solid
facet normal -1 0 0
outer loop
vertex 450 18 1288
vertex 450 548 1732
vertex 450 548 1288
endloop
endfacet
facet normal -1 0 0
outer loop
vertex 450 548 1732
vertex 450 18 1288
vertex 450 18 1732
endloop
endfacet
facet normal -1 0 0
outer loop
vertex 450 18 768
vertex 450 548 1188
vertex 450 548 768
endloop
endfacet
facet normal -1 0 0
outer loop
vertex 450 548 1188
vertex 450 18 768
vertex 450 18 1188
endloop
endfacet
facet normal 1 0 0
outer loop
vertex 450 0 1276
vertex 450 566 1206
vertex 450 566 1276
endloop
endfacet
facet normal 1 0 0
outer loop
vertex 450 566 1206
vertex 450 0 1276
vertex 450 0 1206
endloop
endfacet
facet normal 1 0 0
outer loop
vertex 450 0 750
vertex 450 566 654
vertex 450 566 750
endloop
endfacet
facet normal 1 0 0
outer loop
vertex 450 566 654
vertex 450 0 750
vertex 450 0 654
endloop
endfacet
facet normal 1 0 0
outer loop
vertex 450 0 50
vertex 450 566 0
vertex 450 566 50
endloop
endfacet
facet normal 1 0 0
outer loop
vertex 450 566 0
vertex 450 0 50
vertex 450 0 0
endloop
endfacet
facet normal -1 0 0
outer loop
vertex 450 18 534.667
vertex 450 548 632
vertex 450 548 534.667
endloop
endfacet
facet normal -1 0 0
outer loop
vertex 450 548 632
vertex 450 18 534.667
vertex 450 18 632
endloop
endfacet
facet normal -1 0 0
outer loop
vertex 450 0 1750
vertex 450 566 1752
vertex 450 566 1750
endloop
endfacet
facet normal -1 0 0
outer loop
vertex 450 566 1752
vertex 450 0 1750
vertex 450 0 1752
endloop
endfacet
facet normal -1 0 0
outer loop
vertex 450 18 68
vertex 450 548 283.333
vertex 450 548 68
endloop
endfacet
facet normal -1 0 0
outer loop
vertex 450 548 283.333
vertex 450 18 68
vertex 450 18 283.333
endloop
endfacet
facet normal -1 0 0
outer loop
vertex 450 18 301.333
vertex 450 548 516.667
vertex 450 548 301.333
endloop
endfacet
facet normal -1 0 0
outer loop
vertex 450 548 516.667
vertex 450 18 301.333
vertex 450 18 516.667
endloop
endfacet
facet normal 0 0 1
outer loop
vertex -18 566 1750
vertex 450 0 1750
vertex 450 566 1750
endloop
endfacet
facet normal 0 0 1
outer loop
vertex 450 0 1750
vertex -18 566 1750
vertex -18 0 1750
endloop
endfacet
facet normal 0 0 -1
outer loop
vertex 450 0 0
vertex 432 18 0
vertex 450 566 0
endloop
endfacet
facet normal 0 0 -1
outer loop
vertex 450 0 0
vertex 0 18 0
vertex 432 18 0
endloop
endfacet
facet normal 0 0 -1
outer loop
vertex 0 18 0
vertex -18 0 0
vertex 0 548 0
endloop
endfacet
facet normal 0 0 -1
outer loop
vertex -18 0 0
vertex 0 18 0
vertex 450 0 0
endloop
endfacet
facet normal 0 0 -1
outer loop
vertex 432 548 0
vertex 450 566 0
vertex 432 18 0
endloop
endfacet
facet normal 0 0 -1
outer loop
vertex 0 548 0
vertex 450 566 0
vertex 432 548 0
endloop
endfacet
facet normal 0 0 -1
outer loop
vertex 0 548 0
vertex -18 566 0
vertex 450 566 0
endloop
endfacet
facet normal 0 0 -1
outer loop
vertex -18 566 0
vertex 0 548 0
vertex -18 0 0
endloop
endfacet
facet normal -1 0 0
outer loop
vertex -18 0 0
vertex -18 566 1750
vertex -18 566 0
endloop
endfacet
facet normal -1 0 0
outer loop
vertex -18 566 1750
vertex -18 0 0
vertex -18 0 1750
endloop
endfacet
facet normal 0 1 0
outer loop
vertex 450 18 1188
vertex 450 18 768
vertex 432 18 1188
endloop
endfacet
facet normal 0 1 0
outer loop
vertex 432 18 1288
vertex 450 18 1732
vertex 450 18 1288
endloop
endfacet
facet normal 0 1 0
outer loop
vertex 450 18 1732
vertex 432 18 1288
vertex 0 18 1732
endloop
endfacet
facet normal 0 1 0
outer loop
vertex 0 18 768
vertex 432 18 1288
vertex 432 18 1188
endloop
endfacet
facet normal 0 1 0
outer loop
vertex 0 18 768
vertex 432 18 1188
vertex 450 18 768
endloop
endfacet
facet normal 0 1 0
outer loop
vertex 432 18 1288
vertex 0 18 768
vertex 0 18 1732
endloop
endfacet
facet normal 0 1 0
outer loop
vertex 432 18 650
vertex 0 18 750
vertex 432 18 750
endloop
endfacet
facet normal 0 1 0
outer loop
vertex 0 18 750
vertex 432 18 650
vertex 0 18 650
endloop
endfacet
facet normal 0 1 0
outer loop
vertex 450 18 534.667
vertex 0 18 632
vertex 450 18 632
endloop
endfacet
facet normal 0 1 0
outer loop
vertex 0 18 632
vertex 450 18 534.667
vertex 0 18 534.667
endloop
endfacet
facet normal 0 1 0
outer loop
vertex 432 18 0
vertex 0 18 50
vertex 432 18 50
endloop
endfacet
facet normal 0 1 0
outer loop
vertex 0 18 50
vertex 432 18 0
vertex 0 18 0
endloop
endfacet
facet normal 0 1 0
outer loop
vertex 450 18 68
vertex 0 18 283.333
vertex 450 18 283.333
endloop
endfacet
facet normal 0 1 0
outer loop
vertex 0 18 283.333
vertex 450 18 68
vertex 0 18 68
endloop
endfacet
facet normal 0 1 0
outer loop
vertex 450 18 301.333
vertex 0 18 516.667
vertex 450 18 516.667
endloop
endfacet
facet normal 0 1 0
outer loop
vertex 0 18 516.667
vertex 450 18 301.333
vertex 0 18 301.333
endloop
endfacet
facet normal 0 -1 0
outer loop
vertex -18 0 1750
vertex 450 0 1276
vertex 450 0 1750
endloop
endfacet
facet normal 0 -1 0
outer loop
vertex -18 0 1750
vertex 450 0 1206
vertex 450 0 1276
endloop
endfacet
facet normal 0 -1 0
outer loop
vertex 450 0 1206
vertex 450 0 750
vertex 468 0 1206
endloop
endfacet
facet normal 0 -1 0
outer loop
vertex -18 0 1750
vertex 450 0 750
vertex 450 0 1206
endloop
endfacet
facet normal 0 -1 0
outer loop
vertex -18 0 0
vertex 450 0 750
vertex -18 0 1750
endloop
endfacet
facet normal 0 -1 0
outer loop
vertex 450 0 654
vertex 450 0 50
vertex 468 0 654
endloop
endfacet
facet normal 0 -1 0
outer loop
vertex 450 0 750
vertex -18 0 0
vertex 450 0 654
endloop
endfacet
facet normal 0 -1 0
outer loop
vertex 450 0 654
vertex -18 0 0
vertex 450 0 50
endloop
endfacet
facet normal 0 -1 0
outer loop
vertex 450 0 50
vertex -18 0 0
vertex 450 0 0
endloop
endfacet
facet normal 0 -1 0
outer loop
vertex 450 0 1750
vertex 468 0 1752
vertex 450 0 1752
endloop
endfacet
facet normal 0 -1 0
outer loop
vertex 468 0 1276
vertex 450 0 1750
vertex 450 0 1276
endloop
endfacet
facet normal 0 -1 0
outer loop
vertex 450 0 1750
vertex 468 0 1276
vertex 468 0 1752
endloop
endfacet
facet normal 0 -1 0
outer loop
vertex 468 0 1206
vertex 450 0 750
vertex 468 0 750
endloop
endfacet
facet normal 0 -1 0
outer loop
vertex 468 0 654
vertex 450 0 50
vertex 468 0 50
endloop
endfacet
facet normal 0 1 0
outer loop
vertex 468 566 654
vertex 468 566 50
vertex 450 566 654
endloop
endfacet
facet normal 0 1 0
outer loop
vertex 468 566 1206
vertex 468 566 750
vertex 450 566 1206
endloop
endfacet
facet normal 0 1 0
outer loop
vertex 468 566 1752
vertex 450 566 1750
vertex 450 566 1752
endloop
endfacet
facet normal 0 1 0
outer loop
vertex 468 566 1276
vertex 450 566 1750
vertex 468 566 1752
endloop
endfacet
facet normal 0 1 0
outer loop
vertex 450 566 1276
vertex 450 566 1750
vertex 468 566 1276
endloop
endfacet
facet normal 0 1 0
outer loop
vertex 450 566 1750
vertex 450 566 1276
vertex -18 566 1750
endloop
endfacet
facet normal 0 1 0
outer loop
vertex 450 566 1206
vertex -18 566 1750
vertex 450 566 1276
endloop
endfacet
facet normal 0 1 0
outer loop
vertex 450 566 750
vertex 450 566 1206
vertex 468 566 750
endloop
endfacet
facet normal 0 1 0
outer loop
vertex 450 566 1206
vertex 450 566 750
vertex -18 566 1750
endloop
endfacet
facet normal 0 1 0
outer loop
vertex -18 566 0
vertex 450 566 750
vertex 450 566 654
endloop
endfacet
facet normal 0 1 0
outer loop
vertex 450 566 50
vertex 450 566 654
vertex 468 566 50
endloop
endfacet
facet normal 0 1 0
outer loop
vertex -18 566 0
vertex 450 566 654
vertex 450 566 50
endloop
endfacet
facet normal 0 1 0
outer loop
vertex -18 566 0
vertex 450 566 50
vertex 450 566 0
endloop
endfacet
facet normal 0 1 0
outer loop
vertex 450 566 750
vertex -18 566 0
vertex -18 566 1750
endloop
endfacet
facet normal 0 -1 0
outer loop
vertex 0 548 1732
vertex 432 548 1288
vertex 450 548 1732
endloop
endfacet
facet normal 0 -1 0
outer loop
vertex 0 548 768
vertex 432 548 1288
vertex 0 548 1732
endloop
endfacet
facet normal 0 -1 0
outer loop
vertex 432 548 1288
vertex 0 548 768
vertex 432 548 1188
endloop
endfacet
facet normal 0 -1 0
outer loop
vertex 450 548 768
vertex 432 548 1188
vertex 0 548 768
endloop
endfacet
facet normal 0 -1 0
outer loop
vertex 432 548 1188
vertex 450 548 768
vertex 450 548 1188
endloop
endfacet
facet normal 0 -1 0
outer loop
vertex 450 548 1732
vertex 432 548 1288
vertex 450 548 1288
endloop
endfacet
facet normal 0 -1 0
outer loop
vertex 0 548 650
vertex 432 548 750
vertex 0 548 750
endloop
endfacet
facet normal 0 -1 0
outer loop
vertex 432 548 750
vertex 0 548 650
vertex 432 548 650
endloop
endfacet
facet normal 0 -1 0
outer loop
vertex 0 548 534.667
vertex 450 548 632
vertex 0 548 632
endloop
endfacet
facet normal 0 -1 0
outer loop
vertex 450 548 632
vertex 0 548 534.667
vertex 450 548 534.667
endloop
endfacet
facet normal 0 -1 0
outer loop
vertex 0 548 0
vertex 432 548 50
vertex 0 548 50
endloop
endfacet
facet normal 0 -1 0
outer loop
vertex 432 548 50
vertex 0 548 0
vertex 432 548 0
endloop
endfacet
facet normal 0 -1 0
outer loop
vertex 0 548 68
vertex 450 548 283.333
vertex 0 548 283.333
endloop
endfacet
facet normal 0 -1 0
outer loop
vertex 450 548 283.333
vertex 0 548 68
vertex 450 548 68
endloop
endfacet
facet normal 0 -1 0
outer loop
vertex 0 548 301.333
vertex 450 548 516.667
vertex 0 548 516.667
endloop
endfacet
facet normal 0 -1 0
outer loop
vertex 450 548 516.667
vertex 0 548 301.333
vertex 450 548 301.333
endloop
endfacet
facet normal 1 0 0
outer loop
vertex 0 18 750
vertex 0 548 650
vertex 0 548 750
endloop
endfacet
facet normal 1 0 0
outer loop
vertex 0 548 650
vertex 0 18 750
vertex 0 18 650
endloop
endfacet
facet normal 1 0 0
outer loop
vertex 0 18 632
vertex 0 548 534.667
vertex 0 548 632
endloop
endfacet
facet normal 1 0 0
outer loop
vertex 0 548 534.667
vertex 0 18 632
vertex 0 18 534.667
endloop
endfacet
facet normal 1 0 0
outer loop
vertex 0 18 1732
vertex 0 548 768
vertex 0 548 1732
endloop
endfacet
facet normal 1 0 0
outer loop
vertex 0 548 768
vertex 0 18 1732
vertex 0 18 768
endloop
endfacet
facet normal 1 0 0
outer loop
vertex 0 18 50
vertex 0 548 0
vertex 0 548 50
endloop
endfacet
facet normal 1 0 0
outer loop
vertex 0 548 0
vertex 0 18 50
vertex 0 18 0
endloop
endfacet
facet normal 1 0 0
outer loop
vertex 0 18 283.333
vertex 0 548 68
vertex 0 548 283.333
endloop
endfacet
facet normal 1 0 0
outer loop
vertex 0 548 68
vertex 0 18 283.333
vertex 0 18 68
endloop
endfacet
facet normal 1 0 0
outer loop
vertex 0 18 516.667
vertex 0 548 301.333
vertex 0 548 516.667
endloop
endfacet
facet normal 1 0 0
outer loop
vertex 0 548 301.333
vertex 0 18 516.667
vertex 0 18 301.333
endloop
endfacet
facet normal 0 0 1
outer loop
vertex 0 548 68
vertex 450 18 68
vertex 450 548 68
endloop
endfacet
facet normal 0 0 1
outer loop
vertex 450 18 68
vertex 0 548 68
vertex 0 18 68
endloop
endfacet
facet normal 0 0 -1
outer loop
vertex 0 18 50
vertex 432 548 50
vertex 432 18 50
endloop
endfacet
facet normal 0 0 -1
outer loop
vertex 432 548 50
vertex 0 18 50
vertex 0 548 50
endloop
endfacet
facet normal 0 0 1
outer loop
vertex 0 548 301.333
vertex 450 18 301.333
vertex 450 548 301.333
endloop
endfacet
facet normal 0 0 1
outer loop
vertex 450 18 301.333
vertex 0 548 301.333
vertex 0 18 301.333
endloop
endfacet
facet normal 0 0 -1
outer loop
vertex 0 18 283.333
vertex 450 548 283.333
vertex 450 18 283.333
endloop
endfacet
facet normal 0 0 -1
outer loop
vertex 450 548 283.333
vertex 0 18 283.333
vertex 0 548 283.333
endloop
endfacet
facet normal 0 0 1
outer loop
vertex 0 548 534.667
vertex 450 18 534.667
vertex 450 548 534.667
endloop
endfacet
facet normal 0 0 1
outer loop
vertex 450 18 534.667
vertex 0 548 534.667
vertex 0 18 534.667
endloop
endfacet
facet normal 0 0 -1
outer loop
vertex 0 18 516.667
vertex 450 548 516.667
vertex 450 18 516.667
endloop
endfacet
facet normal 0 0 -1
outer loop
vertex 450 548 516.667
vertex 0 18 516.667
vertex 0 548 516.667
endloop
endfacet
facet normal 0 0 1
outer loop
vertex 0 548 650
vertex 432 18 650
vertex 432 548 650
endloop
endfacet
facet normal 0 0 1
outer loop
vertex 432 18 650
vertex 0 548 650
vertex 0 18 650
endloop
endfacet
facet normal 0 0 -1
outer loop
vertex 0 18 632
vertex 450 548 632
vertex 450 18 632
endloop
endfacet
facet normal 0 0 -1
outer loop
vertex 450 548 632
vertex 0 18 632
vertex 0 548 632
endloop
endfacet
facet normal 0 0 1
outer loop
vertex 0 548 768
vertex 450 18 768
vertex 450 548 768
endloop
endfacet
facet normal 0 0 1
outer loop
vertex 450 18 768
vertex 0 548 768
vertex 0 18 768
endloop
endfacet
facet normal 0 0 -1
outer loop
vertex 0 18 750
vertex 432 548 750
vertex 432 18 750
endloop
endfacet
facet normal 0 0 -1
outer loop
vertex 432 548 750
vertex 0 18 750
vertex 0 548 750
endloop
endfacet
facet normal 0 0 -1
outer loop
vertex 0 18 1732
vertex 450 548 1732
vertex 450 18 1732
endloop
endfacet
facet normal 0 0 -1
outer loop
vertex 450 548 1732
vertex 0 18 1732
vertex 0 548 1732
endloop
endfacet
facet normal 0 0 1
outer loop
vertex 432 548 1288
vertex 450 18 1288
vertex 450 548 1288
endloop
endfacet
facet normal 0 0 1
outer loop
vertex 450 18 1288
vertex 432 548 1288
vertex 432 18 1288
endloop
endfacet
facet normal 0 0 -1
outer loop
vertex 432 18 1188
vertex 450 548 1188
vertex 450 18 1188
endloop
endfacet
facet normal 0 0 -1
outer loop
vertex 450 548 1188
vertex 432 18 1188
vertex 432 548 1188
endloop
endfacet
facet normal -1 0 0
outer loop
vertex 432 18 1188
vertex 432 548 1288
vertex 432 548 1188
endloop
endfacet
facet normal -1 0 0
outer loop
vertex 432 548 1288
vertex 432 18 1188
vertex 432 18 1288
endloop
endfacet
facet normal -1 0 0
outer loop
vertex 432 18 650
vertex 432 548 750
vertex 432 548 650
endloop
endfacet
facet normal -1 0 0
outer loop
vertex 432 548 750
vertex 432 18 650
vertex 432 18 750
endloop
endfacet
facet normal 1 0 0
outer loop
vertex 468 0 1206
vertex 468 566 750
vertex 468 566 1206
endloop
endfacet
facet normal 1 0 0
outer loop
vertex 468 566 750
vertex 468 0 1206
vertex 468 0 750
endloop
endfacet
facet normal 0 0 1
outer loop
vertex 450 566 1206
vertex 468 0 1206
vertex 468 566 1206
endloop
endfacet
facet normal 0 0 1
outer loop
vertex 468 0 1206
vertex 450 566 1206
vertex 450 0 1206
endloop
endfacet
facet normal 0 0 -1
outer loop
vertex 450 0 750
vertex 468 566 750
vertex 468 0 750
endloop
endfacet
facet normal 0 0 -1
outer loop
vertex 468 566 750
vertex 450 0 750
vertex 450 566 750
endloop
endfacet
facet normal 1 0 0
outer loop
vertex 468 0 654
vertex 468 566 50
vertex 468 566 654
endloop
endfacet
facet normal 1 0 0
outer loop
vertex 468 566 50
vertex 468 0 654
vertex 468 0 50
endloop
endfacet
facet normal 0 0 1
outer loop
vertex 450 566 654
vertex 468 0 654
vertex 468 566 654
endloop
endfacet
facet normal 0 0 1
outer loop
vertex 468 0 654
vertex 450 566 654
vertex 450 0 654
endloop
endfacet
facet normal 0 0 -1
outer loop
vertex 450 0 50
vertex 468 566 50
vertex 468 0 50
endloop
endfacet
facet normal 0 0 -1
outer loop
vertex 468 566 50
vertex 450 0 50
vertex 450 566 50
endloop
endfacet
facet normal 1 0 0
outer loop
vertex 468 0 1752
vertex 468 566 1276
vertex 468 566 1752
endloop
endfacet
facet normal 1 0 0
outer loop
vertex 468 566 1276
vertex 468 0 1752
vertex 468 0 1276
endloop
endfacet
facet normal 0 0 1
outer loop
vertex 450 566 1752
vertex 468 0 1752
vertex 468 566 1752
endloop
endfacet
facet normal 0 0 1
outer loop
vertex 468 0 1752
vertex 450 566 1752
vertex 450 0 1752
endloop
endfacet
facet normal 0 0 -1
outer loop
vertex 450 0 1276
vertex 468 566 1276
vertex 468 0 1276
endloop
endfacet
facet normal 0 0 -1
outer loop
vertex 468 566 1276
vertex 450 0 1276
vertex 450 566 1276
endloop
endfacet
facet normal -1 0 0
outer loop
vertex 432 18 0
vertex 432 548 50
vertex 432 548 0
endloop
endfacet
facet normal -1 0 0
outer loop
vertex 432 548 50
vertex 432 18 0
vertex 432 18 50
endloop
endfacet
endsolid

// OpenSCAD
module panel0(ax,ay,){
    cube([ax,18,ay]);
    echo("Panel", ax, " x ", ay);
}
module panel1(ax,ay,){
    cube([ax,ay,18]);
    echo("Panel", ax, " x ", ay);
}
module panel2(ax,ay,){
    cube([18,ax,ay]);
    echo("Panel", ax, " x ", ay);
}

translate([-18,0,0])panel0(380+70+18,1750);//pared izq
translate([-18,18+530,0])panel0(380+70+18,1750);//pared der
translate([-18,18,0])panel2(530,1750);// tapa trasera del mueble

//de abajo para arriba los estantes
translate([0,18,50])panel1(380+70,530);//estante base
translate([0,18,50 +700/3])panel1(380+70,530);//estante
translate([0,18,50 +2*700/3])panel1(380+70,530);//estante
translate([0,18,50+700-18-100])panel1(380+70,530);// piso electronica
translate([0,18,50+700])panel1(380+70,530);// piso impresora
//translate([0,18,50+700+18+420])panel1(380+70,530);// techo impresora
translate([0,18,1750-18])panel1(380+70,530);// techo estructura
//fin de los estantes


translate([380+70-18,18,50+700+18+420])panel2(530,100);// parante delantero impresora impresora
translate([380+70-18,18,650])panel2(530,100);// parante delantero bajo la impresora
translate([380+70,0,50+700])panel2(530+18*2,420+18*2);// puerta impresora

translate([380+70,0,50])panel2(530+18*2,450+100+18*3);// puerta impresora

translate([380+70,0,50+700+80+18*2+410])panel2(530+18*2,420+18*2+20);// puerta filamentos


translate([380+70-18,18,0])panel2(530,50);// tapa delantera abajo
